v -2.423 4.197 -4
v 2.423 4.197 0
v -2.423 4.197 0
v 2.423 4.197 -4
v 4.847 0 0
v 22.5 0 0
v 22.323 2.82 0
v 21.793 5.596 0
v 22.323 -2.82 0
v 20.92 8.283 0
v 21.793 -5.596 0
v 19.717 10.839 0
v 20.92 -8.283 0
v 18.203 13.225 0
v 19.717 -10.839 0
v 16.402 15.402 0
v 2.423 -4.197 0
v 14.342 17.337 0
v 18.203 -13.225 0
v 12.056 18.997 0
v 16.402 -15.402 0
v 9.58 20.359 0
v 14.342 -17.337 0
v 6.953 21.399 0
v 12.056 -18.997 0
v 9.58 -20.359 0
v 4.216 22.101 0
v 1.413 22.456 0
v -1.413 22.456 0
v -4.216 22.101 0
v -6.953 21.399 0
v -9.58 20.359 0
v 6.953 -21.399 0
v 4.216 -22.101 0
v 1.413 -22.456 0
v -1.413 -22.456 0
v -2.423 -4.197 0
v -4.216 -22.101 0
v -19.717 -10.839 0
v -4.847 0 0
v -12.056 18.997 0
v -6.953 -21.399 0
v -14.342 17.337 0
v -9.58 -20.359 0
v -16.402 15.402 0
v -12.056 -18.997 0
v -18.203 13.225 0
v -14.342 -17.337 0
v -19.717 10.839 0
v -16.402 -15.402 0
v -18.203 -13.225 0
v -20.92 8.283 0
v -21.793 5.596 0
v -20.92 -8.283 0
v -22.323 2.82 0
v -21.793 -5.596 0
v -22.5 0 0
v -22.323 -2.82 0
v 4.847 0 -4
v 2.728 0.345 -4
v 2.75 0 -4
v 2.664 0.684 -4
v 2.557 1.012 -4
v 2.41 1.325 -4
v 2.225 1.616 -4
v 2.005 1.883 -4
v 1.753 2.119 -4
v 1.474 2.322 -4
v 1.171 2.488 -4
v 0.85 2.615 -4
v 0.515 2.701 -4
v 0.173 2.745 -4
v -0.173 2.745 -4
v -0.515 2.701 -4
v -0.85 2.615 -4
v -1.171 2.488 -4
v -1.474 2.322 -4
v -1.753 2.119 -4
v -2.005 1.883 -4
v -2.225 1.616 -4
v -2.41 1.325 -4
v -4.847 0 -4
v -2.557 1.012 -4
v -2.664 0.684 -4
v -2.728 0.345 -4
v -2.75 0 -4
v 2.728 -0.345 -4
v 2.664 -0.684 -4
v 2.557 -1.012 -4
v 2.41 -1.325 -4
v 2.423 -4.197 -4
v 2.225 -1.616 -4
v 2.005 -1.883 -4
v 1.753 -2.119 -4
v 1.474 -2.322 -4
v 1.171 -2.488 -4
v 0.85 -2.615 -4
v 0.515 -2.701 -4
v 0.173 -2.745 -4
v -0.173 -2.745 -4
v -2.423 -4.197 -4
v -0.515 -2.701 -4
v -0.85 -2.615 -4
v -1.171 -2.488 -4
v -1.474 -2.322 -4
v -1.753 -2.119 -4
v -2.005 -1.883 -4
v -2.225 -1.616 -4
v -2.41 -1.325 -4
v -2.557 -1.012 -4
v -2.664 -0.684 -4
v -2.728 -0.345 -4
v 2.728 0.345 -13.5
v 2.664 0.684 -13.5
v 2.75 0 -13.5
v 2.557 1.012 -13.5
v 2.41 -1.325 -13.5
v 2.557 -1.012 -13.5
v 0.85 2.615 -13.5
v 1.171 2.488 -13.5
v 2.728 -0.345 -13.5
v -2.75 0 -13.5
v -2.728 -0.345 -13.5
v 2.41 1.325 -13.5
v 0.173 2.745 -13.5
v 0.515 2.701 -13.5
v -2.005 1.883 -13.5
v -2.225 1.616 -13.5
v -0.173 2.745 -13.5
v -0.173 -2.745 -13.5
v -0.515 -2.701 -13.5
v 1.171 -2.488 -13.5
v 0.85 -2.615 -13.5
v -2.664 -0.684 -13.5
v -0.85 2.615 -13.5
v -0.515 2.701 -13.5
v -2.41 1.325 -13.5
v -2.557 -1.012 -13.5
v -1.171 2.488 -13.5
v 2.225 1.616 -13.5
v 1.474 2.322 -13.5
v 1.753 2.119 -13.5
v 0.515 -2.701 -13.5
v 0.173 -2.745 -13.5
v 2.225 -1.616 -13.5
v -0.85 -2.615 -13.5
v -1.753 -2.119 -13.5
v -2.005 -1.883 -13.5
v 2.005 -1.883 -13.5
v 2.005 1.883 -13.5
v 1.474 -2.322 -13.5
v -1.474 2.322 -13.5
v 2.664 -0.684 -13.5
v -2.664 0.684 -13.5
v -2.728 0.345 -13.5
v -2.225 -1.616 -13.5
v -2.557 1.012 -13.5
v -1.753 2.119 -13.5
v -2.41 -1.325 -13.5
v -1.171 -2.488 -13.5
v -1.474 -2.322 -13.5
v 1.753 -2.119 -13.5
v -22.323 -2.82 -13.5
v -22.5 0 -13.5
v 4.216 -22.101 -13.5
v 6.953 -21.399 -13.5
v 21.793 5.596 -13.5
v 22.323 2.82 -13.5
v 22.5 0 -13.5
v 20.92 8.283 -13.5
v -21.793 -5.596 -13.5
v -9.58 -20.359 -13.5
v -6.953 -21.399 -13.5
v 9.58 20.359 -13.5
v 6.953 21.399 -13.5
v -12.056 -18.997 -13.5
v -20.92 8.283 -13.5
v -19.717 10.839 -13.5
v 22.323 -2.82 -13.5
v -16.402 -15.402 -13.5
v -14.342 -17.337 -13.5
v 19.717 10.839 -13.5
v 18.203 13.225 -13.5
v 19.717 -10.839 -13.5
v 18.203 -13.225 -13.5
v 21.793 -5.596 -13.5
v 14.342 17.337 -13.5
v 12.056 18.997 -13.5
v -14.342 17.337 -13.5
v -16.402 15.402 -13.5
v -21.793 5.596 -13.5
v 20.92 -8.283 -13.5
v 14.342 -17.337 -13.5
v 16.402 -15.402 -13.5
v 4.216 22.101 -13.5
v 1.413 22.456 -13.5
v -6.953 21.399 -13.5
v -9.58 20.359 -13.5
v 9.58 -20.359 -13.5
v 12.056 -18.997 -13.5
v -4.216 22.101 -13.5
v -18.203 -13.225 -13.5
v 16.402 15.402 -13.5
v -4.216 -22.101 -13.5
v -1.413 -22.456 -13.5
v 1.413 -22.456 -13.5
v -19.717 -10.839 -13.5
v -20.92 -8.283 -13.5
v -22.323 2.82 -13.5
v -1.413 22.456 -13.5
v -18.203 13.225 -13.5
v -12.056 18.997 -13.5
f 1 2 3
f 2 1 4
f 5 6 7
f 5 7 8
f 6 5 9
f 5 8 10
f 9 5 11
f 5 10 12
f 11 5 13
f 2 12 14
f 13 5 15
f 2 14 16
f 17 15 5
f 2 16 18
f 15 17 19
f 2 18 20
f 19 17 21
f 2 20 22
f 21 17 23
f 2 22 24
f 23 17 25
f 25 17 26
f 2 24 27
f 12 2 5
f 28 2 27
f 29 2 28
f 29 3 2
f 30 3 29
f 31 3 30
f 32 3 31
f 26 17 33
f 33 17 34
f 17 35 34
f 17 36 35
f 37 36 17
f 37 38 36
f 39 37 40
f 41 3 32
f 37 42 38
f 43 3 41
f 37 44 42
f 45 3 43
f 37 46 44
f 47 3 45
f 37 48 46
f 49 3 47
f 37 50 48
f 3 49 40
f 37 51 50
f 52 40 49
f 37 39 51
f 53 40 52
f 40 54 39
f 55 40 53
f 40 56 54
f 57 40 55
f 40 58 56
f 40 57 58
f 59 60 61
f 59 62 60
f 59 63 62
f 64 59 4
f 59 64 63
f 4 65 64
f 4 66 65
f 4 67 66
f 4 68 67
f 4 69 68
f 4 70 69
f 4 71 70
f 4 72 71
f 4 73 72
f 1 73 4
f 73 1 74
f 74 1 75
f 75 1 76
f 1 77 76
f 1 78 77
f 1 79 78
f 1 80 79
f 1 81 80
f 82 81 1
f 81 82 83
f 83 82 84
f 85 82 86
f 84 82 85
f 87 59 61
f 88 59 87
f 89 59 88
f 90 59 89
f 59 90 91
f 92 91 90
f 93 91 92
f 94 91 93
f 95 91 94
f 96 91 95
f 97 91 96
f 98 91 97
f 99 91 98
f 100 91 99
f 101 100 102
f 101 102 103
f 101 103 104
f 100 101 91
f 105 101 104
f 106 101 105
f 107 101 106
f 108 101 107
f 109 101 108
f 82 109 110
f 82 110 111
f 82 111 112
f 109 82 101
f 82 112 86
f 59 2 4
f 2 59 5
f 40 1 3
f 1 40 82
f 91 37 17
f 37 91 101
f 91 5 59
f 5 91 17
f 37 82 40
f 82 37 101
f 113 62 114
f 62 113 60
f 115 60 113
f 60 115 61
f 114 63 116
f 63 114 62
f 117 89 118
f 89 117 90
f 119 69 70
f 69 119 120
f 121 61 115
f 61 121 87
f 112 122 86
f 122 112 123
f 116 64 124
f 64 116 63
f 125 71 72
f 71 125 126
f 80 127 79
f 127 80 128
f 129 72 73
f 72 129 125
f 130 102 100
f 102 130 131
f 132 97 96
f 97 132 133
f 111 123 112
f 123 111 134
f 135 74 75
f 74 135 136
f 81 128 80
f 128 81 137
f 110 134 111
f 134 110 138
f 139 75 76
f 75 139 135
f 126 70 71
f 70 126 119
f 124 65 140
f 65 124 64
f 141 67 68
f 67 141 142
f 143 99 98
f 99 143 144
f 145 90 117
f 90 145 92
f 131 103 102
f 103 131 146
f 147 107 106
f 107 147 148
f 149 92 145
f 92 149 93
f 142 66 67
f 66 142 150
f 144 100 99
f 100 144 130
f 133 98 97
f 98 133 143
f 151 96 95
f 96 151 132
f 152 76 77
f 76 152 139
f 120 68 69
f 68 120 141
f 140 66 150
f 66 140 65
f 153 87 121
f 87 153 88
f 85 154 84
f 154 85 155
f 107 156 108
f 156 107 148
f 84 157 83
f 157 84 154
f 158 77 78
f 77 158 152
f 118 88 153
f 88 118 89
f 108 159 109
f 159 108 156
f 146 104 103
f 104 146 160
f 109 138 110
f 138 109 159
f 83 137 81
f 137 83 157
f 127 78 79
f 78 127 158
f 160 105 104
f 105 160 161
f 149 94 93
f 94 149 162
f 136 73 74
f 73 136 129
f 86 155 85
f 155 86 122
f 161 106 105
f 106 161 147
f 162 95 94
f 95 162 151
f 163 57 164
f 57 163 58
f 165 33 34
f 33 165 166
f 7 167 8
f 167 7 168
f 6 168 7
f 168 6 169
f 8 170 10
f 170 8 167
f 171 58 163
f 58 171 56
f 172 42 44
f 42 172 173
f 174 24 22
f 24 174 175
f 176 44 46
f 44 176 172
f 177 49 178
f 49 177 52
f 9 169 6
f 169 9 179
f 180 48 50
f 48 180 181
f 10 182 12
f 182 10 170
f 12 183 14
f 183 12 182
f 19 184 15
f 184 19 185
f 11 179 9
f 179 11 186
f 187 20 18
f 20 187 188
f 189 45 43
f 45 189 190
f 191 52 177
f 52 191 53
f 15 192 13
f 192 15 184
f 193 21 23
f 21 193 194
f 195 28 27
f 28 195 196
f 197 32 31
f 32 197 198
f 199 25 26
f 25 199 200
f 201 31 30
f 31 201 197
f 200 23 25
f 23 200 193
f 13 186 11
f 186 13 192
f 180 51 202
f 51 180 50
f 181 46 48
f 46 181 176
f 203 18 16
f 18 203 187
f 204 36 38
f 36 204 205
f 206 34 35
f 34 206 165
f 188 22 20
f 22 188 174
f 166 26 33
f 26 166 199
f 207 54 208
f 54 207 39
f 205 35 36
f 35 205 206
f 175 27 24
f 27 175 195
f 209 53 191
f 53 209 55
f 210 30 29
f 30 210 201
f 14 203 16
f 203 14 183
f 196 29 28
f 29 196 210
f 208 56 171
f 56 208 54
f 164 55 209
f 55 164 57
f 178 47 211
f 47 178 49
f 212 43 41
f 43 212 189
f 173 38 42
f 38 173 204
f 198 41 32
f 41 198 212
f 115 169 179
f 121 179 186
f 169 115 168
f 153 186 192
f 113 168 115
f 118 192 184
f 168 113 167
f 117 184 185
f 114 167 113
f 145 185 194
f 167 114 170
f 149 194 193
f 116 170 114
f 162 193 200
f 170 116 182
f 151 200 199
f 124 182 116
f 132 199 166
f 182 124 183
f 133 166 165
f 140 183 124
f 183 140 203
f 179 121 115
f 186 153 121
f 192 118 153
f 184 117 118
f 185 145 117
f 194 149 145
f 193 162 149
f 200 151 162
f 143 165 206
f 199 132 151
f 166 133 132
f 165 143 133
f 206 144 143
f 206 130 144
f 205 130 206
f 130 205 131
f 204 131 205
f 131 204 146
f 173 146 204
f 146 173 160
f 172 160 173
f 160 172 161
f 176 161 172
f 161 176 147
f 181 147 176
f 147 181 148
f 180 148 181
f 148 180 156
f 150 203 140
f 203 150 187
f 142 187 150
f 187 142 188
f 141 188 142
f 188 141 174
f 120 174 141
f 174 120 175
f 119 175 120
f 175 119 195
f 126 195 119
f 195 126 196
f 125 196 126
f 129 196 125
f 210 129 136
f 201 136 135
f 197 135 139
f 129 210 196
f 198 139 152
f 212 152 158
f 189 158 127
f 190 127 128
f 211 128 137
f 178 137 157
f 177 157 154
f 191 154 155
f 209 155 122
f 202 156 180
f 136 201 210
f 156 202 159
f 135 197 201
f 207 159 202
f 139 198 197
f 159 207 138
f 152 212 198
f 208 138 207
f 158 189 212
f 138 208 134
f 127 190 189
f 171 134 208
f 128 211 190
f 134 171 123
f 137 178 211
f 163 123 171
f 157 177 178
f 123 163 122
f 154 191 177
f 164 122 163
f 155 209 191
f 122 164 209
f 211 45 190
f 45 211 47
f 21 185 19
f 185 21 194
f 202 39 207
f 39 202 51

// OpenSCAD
$fn = 50;

difference() {
	union() {
		translate(v = [0, 0, -13.5]) {
			cylinder(h = 13.5, r = 22.5);
		}
	}
	union() {
		translate(v = [0, 0, 0]) {
			rotate(a = [0, 0, 0]) {
				difference() {
					union() {
						translate(v = [0, 0, -4]) {
							linear_extrude(height = 4) {
								polygon(points = [[4.8468, 0.0], [2.4234000000000004, 4.197451927062417], [-2.423399999999999, 4.197451927062417], [-4.8468, 5.935618106107392e-16], [-2.423400000000002, -4.197451927062416], [2.423399999999997, -4.197451927062419]]);
							}
						}
					}
					union();
				}
			}
		}
		#translate(v = [0, 0, -100.0]) {
			cylinder(h = 200, r = 2.75);
		}
	}
}
